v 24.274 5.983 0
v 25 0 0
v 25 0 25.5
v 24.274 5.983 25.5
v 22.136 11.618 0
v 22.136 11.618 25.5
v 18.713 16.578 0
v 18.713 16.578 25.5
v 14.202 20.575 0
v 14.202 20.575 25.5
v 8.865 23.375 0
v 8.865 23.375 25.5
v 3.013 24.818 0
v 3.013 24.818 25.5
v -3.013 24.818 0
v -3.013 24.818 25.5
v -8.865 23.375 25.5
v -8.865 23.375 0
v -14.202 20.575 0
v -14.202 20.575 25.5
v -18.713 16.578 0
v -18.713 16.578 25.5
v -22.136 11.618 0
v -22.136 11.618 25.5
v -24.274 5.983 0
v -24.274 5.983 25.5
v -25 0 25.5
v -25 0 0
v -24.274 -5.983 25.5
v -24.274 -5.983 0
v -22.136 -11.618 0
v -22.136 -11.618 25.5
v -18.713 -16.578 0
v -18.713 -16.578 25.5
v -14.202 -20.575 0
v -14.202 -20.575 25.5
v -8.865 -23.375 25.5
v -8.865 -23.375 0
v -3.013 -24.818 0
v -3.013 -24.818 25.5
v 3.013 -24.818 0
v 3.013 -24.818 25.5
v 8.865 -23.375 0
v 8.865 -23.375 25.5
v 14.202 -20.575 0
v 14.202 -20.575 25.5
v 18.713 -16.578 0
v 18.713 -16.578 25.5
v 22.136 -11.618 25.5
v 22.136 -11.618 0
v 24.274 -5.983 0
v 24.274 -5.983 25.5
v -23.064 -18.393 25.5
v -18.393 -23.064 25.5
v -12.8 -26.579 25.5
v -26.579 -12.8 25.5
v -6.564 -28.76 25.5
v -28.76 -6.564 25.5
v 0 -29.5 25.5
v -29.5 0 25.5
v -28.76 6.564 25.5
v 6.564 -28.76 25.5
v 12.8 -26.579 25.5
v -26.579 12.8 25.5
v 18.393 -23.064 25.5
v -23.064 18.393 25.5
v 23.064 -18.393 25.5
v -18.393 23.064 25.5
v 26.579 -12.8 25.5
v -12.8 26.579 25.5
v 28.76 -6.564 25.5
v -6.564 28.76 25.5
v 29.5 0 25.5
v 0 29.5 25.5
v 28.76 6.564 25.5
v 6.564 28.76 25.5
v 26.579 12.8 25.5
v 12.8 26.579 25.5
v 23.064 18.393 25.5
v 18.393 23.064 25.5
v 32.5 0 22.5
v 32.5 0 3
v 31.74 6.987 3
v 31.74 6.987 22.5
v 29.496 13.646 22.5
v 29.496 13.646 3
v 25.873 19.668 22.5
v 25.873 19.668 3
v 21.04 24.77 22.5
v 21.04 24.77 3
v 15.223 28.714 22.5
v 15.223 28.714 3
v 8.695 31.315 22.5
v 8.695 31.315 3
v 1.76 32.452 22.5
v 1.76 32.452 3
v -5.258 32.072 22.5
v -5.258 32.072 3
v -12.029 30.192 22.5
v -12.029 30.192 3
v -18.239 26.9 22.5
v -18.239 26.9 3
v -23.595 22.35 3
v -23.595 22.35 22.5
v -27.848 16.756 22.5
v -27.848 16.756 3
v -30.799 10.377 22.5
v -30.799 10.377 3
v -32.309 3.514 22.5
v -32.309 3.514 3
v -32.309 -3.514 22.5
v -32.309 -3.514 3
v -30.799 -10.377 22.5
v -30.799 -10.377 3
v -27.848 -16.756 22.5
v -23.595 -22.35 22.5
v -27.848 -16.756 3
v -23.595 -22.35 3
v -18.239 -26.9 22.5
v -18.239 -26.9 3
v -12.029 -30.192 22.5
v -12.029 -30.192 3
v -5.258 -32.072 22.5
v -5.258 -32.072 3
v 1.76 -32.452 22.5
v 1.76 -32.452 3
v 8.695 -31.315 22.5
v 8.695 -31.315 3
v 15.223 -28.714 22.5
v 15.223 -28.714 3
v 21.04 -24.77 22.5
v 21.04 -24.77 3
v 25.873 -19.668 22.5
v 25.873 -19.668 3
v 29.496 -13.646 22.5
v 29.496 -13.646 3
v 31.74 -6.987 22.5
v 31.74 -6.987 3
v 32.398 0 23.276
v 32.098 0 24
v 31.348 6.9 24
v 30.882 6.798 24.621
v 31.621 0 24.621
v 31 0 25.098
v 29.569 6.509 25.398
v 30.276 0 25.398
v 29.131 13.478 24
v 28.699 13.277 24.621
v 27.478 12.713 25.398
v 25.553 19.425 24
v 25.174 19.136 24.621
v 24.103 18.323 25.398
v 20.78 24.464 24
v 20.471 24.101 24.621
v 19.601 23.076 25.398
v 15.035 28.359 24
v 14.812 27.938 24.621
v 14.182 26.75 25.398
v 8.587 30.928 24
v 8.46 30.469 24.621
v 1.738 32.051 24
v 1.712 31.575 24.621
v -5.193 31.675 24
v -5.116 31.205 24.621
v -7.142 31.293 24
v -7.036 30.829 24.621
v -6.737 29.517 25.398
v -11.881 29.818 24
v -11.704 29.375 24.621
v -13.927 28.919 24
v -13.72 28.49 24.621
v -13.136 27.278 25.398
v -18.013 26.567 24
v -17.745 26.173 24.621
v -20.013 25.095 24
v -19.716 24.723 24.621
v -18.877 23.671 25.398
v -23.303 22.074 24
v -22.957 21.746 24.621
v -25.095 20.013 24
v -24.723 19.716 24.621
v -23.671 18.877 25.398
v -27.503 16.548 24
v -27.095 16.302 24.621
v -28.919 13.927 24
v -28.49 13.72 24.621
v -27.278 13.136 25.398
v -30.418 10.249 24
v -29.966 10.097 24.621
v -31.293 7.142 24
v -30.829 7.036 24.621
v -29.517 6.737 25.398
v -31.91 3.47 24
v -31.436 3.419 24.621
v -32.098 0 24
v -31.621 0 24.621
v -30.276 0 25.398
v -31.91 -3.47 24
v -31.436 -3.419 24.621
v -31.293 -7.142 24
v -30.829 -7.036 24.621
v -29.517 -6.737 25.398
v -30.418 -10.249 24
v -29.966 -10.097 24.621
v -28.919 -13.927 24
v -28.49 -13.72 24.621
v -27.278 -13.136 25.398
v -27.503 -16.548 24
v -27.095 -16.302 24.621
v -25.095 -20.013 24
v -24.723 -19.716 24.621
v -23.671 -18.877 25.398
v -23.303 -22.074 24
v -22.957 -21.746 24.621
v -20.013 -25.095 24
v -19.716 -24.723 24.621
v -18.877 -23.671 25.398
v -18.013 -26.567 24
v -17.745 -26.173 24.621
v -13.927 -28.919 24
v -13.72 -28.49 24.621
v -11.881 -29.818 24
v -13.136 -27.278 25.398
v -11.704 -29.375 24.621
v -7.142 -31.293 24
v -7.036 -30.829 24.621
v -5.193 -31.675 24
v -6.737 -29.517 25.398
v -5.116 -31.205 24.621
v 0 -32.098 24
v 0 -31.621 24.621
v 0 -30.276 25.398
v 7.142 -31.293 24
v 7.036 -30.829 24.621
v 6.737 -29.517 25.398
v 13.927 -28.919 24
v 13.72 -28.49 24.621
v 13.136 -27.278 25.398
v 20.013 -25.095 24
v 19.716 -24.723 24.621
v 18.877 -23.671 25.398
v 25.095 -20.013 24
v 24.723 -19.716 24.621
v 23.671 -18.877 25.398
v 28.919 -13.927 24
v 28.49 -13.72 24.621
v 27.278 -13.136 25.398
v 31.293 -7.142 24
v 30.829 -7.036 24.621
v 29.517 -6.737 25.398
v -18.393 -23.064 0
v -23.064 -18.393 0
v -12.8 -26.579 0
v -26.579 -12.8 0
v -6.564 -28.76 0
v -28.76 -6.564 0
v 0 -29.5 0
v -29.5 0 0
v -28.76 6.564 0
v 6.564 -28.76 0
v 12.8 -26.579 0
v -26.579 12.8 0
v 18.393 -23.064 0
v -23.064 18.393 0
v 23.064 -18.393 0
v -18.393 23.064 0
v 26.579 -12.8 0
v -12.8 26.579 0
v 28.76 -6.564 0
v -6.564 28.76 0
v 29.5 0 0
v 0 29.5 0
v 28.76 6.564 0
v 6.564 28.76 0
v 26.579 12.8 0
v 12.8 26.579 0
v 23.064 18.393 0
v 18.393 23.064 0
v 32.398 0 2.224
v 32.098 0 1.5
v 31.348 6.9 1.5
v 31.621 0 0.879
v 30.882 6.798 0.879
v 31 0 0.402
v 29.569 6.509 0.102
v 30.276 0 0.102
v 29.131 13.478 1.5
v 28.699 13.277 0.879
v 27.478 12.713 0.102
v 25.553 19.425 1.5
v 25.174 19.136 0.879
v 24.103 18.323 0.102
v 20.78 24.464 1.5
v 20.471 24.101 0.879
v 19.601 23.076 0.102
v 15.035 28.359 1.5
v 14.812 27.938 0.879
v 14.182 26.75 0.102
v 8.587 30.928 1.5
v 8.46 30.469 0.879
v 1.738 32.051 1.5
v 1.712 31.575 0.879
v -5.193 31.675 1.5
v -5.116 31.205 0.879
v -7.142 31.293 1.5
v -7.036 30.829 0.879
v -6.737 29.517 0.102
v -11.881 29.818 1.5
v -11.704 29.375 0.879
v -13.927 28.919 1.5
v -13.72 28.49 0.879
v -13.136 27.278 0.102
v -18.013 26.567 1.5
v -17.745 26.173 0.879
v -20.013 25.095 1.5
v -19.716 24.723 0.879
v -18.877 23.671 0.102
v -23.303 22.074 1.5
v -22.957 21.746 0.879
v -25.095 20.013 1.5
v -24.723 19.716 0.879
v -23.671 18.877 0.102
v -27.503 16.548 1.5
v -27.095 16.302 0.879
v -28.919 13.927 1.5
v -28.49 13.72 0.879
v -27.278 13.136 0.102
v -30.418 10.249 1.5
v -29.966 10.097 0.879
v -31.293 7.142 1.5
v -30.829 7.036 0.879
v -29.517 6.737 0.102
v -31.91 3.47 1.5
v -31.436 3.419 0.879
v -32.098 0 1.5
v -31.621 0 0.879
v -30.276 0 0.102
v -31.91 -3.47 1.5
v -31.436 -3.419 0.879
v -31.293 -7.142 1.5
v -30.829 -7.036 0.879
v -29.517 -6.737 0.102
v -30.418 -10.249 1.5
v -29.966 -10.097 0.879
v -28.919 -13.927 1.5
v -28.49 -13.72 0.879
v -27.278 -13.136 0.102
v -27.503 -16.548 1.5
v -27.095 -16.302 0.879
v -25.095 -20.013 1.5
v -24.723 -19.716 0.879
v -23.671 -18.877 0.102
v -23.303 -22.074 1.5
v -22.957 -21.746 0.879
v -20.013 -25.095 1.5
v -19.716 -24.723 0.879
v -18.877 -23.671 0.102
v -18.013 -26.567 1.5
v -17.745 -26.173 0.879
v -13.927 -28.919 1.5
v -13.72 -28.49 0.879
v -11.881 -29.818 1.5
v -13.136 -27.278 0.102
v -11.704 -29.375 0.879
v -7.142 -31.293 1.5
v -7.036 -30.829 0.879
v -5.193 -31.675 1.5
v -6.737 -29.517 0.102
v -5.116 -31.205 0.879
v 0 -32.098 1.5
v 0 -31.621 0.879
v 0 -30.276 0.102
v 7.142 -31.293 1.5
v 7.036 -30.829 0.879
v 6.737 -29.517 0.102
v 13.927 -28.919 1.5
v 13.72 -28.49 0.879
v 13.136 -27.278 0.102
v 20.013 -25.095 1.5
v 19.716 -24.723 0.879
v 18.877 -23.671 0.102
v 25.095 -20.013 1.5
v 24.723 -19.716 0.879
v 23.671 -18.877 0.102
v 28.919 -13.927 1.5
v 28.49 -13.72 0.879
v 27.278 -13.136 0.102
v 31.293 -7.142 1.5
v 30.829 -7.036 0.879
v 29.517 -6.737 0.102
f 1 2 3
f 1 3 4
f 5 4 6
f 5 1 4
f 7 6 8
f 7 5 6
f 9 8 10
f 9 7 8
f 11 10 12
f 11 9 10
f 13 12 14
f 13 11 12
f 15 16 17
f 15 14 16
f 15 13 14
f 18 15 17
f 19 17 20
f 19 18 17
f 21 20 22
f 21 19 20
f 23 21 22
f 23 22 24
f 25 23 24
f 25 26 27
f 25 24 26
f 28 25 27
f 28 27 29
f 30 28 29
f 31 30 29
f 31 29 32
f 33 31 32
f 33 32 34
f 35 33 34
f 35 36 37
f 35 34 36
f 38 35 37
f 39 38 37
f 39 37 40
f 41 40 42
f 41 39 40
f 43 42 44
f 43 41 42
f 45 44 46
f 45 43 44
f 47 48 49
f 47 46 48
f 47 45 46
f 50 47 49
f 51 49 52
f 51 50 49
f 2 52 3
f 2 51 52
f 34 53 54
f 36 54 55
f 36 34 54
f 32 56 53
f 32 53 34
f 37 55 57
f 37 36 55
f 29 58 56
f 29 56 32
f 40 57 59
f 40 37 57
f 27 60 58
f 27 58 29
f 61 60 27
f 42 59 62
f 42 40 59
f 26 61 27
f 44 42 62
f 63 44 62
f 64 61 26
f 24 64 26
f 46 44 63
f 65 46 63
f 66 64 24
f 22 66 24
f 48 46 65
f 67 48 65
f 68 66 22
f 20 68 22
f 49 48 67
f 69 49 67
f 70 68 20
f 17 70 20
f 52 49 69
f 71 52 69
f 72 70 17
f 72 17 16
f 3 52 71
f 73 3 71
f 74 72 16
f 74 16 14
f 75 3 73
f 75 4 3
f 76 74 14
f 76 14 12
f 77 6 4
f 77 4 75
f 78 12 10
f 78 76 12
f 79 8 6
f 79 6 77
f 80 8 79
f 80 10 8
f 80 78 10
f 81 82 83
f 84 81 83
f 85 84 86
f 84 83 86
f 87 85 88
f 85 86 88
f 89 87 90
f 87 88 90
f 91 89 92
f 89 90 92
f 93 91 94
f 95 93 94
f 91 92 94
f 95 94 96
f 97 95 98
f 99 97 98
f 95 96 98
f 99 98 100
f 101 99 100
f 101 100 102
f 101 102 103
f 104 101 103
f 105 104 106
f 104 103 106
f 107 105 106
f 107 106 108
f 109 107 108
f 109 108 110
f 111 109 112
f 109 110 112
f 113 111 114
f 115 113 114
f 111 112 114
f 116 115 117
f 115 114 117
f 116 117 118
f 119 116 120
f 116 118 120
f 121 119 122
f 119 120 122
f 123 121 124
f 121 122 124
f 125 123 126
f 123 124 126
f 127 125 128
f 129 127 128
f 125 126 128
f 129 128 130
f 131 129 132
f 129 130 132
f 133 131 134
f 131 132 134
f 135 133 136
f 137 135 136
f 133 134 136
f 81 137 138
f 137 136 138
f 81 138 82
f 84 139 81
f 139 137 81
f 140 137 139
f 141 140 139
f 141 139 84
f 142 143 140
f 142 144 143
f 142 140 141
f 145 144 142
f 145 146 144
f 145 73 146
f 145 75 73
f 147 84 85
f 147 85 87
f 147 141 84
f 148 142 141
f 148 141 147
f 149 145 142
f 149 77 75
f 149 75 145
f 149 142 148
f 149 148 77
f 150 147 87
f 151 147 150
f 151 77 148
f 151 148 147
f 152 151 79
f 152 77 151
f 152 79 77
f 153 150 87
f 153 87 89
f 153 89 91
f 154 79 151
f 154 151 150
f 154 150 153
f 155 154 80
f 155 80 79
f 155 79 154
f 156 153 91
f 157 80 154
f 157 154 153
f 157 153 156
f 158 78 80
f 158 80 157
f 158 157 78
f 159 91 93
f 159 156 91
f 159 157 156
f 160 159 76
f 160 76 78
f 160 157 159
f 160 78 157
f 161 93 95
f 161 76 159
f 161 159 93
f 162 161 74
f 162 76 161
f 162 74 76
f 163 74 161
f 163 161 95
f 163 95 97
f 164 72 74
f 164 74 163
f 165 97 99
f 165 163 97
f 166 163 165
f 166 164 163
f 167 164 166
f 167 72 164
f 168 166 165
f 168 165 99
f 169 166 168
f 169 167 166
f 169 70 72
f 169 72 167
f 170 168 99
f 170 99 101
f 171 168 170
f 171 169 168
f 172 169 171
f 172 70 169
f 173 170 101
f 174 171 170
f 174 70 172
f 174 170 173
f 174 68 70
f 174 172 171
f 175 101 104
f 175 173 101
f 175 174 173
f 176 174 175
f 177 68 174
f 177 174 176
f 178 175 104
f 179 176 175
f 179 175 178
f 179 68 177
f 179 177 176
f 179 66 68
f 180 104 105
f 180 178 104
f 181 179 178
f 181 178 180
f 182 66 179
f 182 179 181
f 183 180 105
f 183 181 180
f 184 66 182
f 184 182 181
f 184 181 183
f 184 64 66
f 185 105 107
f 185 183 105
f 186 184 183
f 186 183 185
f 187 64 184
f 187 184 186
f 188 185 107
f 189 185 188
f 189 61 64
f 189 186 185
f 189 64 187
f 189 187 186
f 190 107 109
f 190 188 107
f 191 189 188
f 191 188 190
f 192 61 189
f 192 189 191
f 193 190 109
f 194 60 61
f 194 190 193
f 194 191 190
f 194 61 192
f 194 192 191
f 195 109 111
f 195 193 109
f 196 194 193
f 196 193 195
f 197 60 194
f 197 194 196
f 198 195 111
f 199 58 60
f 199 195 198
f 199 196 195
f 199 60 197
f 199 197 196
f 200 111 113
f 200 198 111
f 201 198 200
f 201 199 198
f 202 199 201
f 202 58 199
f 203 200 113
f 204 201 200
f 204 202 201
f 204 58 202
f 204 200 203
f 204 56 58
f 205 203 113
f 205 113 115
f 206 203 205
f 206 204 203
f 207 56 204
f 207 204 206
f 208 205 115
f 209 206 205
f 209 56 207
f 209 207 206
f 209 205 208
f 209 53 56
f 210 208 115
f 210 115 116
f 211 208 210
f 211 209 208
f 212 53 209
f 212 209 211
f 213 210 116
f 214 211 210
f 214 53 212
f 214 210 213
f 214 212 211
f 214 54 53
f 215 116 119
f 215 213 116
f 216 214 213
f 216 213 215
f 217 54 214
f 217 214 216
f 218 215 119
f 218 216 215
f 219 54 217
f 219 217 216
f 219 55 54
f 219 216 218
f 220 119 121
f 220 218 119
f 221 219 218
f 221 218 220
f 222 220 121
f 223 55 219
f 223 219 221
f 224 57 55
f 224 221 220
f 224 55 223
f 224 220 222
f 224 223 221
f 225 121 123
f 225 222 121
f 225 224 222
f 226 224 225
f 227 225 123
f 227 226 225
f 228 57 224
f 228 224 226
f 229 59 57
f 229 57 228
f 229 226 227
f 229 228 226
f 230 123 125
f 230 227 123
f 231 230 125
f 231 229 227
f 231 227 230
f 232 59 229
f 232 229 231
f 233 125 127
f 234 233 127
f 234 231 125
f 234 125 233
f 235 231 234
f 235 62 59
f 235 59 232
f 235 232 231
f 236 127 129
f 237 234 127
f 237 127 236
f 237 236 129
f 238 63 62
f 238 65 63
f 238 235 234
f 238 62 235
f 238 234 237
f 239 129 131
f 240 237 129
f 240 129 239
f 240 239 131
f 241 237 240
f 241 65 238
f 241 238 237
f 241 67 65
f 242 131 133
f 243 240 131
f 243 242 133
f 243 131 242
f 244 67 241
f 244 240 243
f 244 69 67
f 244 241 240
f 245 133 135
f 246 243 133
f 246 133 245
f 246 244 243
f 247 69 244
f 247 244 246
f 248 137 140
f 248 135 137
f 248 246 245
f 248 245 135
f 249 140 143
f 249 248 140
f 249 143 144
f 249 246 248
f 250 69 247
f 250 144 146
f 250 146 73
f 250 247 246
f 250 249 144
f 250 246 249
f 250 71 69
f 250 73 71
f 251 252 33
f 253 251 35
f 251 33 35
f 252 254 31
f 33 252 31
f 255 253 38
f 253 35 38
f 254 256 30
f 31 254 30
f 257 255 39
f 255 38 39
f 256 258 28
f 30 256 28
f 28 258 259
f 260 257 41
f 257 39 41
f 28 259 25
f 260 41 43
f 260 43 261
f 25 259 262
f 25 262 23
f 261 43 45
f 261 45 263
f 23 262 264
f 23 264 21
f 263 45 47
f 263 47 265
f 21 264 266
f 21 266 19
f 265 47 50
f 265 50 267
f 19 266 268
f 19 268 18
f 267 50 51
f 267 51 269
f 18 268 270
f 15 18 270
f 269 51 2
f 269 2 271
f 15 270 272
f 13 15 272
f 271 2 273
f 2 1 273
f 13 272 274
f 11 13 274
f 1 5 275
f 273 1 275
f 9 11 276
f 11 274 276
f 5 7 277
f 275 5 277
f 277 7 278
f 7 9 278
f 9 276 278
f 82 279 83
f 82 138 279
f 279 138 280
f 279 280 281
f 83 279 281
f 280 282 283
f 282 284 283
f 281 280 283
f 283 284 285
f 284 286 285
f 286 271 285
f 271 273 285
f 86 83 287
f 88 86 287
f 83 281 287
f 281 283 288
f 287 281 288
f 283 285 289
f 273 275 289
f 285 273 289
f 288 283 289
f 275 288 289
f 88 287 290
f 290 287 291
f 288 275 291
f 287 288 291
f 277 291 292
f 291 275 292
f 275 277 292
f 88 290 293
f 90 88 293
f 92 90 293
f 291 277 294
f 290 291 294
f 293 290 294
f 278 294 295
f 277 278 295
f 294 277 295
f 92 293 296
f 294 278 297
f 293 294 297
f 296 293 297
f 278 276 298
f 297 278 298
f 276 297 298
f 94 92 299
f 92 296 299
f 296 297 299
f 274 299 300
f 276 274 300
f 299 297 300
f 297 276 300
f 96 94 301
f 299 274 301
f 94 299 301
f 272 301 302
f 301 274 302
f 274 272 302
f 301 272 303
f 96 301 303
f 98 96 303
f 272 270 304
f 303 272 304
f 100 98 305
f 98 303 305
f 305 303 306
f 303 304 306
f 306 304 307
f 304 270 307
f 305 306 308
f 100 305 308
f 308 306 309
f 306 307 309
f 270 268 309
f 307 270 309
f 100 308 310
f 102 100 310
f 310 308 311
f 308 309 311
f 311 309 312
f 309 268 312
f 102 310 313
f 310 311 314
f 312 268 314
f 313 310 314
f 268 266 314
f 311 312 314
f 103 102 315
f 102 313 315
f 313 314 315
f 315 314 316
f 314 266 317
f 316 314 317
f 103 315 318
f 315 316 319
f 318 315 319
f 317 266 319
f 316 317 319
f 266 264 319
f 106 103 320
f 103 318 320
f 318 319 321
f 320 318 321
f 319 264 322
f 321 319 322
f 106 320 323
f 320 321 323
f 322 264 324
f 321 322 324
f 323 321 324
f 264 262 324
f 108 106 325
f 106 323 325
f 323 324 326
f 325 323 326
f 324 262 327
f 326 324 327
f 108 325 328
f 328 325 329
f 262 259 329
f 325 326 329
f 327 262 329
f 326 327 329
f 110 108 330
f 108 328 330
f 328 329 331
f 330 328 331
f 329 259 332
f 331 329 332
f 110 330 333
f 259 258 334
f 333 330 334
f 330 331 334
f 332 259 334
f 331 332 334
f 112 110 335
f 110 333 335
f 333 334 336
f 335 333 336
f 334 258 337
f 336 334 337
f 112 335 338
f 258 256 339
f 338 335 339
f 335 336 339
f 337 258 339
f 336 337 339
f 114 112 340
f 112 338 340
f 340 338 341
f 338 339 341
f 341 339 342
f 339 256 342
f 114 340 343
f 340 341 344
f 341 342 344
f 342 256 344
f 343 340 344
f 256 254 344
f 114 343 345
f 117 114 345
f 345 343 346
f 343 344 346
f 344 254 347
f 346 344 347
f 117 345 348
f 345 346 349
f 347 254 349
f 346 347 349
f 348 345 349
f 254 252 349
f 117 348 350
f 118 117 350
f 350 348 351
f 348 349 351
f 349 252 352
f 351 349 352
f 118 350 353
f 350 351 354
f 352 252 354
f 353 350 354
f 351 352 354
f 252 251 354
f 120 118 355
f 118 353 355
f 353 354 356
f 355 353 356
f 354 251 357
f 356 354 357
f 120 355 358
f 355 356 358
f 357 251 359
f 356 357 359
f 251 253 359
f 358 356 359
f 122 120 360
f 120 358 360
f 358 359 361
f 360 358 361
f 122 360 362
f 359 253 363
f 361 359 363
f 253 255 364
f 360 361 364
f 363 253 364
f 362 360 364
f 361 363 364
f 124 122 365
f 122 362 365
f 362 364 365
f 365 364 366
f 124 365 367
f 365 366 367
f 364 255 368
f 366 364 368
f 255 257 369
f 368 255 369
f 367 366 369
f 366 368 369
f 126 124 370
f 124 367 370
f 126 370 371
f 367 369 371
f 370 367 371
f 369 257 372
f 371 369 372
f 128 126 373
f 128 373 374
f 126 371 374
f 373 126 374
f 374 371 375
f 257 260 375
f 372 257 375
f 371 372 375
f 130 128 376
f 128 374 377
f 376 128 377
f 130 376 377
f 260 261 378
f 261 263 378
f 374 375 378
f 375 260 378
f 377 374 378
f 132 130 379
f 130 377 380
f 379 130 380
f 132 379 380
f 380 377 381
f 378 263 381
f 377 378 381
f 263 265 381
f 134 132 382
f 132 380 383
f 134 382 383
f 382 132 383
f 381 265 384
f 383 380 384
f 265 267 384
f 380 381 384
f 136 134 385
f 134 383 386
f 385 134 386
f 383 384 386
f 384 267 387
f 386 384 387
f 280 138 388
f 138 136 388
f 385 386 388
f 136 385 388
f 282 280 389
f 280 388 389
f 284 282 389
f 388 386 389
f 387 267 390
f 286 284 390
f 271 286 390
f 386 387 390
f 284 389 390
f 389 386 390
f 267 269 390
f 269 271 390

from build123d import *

# Parameters (mm, degrees)
SKETCH_1_R               = 32.5
EXTRUDE_1_DEPTH          = 25.5
CUT_EXTRUDE_1_DEPTH      = 53.561868308
CUT_EXTRUDE_1_DEPTH_BACK = 53.561868308
SKETCH_2_R               = 25
FILLET_1_R               = 3
FILLET_2_R               = 3


with BuildPart() as part:
    # 草图1 → 凸台-拉伸1 (new body)
    with BuildSketch(Plane.XY):
        Circle(SKETCH_1_R)
    extrude(amount=EXTRUDE_1_DEPTH)

    # 草图2 → 切除-拉伸1 (cut, two sides: drawn at the far end of the back side and taken through both)
    with BuildSketch(Plane.XY.offset(25.5).offset(-CUT_EXTRUDE_1_DEPTH_BACK)):
        Circle(SKETCH_2_R)
    extrude(amount=CUT_EXTRUDE_1_DEPTH + CUT_EXTRUDE_1_DEPTH_BACK, mode=Mode.SUBTRACT)

    # 圆角1
    fillet_1_edges = [part.edges().sort_by_distance(p)[0] for p in [
        (-32.5, 0, 25.5),
    ]]
    fillet(fillet_1_edges, radius=FILLET_1_R)

    # 圆角2
    fillet_2_edges = [part.edges().sort_by_distance(p)[0] for p in [
        (-32.5, 0, 0),
    ]]
    fillet(fillet_2_edges, radius=FILLET_2_R)


solid = part.part
